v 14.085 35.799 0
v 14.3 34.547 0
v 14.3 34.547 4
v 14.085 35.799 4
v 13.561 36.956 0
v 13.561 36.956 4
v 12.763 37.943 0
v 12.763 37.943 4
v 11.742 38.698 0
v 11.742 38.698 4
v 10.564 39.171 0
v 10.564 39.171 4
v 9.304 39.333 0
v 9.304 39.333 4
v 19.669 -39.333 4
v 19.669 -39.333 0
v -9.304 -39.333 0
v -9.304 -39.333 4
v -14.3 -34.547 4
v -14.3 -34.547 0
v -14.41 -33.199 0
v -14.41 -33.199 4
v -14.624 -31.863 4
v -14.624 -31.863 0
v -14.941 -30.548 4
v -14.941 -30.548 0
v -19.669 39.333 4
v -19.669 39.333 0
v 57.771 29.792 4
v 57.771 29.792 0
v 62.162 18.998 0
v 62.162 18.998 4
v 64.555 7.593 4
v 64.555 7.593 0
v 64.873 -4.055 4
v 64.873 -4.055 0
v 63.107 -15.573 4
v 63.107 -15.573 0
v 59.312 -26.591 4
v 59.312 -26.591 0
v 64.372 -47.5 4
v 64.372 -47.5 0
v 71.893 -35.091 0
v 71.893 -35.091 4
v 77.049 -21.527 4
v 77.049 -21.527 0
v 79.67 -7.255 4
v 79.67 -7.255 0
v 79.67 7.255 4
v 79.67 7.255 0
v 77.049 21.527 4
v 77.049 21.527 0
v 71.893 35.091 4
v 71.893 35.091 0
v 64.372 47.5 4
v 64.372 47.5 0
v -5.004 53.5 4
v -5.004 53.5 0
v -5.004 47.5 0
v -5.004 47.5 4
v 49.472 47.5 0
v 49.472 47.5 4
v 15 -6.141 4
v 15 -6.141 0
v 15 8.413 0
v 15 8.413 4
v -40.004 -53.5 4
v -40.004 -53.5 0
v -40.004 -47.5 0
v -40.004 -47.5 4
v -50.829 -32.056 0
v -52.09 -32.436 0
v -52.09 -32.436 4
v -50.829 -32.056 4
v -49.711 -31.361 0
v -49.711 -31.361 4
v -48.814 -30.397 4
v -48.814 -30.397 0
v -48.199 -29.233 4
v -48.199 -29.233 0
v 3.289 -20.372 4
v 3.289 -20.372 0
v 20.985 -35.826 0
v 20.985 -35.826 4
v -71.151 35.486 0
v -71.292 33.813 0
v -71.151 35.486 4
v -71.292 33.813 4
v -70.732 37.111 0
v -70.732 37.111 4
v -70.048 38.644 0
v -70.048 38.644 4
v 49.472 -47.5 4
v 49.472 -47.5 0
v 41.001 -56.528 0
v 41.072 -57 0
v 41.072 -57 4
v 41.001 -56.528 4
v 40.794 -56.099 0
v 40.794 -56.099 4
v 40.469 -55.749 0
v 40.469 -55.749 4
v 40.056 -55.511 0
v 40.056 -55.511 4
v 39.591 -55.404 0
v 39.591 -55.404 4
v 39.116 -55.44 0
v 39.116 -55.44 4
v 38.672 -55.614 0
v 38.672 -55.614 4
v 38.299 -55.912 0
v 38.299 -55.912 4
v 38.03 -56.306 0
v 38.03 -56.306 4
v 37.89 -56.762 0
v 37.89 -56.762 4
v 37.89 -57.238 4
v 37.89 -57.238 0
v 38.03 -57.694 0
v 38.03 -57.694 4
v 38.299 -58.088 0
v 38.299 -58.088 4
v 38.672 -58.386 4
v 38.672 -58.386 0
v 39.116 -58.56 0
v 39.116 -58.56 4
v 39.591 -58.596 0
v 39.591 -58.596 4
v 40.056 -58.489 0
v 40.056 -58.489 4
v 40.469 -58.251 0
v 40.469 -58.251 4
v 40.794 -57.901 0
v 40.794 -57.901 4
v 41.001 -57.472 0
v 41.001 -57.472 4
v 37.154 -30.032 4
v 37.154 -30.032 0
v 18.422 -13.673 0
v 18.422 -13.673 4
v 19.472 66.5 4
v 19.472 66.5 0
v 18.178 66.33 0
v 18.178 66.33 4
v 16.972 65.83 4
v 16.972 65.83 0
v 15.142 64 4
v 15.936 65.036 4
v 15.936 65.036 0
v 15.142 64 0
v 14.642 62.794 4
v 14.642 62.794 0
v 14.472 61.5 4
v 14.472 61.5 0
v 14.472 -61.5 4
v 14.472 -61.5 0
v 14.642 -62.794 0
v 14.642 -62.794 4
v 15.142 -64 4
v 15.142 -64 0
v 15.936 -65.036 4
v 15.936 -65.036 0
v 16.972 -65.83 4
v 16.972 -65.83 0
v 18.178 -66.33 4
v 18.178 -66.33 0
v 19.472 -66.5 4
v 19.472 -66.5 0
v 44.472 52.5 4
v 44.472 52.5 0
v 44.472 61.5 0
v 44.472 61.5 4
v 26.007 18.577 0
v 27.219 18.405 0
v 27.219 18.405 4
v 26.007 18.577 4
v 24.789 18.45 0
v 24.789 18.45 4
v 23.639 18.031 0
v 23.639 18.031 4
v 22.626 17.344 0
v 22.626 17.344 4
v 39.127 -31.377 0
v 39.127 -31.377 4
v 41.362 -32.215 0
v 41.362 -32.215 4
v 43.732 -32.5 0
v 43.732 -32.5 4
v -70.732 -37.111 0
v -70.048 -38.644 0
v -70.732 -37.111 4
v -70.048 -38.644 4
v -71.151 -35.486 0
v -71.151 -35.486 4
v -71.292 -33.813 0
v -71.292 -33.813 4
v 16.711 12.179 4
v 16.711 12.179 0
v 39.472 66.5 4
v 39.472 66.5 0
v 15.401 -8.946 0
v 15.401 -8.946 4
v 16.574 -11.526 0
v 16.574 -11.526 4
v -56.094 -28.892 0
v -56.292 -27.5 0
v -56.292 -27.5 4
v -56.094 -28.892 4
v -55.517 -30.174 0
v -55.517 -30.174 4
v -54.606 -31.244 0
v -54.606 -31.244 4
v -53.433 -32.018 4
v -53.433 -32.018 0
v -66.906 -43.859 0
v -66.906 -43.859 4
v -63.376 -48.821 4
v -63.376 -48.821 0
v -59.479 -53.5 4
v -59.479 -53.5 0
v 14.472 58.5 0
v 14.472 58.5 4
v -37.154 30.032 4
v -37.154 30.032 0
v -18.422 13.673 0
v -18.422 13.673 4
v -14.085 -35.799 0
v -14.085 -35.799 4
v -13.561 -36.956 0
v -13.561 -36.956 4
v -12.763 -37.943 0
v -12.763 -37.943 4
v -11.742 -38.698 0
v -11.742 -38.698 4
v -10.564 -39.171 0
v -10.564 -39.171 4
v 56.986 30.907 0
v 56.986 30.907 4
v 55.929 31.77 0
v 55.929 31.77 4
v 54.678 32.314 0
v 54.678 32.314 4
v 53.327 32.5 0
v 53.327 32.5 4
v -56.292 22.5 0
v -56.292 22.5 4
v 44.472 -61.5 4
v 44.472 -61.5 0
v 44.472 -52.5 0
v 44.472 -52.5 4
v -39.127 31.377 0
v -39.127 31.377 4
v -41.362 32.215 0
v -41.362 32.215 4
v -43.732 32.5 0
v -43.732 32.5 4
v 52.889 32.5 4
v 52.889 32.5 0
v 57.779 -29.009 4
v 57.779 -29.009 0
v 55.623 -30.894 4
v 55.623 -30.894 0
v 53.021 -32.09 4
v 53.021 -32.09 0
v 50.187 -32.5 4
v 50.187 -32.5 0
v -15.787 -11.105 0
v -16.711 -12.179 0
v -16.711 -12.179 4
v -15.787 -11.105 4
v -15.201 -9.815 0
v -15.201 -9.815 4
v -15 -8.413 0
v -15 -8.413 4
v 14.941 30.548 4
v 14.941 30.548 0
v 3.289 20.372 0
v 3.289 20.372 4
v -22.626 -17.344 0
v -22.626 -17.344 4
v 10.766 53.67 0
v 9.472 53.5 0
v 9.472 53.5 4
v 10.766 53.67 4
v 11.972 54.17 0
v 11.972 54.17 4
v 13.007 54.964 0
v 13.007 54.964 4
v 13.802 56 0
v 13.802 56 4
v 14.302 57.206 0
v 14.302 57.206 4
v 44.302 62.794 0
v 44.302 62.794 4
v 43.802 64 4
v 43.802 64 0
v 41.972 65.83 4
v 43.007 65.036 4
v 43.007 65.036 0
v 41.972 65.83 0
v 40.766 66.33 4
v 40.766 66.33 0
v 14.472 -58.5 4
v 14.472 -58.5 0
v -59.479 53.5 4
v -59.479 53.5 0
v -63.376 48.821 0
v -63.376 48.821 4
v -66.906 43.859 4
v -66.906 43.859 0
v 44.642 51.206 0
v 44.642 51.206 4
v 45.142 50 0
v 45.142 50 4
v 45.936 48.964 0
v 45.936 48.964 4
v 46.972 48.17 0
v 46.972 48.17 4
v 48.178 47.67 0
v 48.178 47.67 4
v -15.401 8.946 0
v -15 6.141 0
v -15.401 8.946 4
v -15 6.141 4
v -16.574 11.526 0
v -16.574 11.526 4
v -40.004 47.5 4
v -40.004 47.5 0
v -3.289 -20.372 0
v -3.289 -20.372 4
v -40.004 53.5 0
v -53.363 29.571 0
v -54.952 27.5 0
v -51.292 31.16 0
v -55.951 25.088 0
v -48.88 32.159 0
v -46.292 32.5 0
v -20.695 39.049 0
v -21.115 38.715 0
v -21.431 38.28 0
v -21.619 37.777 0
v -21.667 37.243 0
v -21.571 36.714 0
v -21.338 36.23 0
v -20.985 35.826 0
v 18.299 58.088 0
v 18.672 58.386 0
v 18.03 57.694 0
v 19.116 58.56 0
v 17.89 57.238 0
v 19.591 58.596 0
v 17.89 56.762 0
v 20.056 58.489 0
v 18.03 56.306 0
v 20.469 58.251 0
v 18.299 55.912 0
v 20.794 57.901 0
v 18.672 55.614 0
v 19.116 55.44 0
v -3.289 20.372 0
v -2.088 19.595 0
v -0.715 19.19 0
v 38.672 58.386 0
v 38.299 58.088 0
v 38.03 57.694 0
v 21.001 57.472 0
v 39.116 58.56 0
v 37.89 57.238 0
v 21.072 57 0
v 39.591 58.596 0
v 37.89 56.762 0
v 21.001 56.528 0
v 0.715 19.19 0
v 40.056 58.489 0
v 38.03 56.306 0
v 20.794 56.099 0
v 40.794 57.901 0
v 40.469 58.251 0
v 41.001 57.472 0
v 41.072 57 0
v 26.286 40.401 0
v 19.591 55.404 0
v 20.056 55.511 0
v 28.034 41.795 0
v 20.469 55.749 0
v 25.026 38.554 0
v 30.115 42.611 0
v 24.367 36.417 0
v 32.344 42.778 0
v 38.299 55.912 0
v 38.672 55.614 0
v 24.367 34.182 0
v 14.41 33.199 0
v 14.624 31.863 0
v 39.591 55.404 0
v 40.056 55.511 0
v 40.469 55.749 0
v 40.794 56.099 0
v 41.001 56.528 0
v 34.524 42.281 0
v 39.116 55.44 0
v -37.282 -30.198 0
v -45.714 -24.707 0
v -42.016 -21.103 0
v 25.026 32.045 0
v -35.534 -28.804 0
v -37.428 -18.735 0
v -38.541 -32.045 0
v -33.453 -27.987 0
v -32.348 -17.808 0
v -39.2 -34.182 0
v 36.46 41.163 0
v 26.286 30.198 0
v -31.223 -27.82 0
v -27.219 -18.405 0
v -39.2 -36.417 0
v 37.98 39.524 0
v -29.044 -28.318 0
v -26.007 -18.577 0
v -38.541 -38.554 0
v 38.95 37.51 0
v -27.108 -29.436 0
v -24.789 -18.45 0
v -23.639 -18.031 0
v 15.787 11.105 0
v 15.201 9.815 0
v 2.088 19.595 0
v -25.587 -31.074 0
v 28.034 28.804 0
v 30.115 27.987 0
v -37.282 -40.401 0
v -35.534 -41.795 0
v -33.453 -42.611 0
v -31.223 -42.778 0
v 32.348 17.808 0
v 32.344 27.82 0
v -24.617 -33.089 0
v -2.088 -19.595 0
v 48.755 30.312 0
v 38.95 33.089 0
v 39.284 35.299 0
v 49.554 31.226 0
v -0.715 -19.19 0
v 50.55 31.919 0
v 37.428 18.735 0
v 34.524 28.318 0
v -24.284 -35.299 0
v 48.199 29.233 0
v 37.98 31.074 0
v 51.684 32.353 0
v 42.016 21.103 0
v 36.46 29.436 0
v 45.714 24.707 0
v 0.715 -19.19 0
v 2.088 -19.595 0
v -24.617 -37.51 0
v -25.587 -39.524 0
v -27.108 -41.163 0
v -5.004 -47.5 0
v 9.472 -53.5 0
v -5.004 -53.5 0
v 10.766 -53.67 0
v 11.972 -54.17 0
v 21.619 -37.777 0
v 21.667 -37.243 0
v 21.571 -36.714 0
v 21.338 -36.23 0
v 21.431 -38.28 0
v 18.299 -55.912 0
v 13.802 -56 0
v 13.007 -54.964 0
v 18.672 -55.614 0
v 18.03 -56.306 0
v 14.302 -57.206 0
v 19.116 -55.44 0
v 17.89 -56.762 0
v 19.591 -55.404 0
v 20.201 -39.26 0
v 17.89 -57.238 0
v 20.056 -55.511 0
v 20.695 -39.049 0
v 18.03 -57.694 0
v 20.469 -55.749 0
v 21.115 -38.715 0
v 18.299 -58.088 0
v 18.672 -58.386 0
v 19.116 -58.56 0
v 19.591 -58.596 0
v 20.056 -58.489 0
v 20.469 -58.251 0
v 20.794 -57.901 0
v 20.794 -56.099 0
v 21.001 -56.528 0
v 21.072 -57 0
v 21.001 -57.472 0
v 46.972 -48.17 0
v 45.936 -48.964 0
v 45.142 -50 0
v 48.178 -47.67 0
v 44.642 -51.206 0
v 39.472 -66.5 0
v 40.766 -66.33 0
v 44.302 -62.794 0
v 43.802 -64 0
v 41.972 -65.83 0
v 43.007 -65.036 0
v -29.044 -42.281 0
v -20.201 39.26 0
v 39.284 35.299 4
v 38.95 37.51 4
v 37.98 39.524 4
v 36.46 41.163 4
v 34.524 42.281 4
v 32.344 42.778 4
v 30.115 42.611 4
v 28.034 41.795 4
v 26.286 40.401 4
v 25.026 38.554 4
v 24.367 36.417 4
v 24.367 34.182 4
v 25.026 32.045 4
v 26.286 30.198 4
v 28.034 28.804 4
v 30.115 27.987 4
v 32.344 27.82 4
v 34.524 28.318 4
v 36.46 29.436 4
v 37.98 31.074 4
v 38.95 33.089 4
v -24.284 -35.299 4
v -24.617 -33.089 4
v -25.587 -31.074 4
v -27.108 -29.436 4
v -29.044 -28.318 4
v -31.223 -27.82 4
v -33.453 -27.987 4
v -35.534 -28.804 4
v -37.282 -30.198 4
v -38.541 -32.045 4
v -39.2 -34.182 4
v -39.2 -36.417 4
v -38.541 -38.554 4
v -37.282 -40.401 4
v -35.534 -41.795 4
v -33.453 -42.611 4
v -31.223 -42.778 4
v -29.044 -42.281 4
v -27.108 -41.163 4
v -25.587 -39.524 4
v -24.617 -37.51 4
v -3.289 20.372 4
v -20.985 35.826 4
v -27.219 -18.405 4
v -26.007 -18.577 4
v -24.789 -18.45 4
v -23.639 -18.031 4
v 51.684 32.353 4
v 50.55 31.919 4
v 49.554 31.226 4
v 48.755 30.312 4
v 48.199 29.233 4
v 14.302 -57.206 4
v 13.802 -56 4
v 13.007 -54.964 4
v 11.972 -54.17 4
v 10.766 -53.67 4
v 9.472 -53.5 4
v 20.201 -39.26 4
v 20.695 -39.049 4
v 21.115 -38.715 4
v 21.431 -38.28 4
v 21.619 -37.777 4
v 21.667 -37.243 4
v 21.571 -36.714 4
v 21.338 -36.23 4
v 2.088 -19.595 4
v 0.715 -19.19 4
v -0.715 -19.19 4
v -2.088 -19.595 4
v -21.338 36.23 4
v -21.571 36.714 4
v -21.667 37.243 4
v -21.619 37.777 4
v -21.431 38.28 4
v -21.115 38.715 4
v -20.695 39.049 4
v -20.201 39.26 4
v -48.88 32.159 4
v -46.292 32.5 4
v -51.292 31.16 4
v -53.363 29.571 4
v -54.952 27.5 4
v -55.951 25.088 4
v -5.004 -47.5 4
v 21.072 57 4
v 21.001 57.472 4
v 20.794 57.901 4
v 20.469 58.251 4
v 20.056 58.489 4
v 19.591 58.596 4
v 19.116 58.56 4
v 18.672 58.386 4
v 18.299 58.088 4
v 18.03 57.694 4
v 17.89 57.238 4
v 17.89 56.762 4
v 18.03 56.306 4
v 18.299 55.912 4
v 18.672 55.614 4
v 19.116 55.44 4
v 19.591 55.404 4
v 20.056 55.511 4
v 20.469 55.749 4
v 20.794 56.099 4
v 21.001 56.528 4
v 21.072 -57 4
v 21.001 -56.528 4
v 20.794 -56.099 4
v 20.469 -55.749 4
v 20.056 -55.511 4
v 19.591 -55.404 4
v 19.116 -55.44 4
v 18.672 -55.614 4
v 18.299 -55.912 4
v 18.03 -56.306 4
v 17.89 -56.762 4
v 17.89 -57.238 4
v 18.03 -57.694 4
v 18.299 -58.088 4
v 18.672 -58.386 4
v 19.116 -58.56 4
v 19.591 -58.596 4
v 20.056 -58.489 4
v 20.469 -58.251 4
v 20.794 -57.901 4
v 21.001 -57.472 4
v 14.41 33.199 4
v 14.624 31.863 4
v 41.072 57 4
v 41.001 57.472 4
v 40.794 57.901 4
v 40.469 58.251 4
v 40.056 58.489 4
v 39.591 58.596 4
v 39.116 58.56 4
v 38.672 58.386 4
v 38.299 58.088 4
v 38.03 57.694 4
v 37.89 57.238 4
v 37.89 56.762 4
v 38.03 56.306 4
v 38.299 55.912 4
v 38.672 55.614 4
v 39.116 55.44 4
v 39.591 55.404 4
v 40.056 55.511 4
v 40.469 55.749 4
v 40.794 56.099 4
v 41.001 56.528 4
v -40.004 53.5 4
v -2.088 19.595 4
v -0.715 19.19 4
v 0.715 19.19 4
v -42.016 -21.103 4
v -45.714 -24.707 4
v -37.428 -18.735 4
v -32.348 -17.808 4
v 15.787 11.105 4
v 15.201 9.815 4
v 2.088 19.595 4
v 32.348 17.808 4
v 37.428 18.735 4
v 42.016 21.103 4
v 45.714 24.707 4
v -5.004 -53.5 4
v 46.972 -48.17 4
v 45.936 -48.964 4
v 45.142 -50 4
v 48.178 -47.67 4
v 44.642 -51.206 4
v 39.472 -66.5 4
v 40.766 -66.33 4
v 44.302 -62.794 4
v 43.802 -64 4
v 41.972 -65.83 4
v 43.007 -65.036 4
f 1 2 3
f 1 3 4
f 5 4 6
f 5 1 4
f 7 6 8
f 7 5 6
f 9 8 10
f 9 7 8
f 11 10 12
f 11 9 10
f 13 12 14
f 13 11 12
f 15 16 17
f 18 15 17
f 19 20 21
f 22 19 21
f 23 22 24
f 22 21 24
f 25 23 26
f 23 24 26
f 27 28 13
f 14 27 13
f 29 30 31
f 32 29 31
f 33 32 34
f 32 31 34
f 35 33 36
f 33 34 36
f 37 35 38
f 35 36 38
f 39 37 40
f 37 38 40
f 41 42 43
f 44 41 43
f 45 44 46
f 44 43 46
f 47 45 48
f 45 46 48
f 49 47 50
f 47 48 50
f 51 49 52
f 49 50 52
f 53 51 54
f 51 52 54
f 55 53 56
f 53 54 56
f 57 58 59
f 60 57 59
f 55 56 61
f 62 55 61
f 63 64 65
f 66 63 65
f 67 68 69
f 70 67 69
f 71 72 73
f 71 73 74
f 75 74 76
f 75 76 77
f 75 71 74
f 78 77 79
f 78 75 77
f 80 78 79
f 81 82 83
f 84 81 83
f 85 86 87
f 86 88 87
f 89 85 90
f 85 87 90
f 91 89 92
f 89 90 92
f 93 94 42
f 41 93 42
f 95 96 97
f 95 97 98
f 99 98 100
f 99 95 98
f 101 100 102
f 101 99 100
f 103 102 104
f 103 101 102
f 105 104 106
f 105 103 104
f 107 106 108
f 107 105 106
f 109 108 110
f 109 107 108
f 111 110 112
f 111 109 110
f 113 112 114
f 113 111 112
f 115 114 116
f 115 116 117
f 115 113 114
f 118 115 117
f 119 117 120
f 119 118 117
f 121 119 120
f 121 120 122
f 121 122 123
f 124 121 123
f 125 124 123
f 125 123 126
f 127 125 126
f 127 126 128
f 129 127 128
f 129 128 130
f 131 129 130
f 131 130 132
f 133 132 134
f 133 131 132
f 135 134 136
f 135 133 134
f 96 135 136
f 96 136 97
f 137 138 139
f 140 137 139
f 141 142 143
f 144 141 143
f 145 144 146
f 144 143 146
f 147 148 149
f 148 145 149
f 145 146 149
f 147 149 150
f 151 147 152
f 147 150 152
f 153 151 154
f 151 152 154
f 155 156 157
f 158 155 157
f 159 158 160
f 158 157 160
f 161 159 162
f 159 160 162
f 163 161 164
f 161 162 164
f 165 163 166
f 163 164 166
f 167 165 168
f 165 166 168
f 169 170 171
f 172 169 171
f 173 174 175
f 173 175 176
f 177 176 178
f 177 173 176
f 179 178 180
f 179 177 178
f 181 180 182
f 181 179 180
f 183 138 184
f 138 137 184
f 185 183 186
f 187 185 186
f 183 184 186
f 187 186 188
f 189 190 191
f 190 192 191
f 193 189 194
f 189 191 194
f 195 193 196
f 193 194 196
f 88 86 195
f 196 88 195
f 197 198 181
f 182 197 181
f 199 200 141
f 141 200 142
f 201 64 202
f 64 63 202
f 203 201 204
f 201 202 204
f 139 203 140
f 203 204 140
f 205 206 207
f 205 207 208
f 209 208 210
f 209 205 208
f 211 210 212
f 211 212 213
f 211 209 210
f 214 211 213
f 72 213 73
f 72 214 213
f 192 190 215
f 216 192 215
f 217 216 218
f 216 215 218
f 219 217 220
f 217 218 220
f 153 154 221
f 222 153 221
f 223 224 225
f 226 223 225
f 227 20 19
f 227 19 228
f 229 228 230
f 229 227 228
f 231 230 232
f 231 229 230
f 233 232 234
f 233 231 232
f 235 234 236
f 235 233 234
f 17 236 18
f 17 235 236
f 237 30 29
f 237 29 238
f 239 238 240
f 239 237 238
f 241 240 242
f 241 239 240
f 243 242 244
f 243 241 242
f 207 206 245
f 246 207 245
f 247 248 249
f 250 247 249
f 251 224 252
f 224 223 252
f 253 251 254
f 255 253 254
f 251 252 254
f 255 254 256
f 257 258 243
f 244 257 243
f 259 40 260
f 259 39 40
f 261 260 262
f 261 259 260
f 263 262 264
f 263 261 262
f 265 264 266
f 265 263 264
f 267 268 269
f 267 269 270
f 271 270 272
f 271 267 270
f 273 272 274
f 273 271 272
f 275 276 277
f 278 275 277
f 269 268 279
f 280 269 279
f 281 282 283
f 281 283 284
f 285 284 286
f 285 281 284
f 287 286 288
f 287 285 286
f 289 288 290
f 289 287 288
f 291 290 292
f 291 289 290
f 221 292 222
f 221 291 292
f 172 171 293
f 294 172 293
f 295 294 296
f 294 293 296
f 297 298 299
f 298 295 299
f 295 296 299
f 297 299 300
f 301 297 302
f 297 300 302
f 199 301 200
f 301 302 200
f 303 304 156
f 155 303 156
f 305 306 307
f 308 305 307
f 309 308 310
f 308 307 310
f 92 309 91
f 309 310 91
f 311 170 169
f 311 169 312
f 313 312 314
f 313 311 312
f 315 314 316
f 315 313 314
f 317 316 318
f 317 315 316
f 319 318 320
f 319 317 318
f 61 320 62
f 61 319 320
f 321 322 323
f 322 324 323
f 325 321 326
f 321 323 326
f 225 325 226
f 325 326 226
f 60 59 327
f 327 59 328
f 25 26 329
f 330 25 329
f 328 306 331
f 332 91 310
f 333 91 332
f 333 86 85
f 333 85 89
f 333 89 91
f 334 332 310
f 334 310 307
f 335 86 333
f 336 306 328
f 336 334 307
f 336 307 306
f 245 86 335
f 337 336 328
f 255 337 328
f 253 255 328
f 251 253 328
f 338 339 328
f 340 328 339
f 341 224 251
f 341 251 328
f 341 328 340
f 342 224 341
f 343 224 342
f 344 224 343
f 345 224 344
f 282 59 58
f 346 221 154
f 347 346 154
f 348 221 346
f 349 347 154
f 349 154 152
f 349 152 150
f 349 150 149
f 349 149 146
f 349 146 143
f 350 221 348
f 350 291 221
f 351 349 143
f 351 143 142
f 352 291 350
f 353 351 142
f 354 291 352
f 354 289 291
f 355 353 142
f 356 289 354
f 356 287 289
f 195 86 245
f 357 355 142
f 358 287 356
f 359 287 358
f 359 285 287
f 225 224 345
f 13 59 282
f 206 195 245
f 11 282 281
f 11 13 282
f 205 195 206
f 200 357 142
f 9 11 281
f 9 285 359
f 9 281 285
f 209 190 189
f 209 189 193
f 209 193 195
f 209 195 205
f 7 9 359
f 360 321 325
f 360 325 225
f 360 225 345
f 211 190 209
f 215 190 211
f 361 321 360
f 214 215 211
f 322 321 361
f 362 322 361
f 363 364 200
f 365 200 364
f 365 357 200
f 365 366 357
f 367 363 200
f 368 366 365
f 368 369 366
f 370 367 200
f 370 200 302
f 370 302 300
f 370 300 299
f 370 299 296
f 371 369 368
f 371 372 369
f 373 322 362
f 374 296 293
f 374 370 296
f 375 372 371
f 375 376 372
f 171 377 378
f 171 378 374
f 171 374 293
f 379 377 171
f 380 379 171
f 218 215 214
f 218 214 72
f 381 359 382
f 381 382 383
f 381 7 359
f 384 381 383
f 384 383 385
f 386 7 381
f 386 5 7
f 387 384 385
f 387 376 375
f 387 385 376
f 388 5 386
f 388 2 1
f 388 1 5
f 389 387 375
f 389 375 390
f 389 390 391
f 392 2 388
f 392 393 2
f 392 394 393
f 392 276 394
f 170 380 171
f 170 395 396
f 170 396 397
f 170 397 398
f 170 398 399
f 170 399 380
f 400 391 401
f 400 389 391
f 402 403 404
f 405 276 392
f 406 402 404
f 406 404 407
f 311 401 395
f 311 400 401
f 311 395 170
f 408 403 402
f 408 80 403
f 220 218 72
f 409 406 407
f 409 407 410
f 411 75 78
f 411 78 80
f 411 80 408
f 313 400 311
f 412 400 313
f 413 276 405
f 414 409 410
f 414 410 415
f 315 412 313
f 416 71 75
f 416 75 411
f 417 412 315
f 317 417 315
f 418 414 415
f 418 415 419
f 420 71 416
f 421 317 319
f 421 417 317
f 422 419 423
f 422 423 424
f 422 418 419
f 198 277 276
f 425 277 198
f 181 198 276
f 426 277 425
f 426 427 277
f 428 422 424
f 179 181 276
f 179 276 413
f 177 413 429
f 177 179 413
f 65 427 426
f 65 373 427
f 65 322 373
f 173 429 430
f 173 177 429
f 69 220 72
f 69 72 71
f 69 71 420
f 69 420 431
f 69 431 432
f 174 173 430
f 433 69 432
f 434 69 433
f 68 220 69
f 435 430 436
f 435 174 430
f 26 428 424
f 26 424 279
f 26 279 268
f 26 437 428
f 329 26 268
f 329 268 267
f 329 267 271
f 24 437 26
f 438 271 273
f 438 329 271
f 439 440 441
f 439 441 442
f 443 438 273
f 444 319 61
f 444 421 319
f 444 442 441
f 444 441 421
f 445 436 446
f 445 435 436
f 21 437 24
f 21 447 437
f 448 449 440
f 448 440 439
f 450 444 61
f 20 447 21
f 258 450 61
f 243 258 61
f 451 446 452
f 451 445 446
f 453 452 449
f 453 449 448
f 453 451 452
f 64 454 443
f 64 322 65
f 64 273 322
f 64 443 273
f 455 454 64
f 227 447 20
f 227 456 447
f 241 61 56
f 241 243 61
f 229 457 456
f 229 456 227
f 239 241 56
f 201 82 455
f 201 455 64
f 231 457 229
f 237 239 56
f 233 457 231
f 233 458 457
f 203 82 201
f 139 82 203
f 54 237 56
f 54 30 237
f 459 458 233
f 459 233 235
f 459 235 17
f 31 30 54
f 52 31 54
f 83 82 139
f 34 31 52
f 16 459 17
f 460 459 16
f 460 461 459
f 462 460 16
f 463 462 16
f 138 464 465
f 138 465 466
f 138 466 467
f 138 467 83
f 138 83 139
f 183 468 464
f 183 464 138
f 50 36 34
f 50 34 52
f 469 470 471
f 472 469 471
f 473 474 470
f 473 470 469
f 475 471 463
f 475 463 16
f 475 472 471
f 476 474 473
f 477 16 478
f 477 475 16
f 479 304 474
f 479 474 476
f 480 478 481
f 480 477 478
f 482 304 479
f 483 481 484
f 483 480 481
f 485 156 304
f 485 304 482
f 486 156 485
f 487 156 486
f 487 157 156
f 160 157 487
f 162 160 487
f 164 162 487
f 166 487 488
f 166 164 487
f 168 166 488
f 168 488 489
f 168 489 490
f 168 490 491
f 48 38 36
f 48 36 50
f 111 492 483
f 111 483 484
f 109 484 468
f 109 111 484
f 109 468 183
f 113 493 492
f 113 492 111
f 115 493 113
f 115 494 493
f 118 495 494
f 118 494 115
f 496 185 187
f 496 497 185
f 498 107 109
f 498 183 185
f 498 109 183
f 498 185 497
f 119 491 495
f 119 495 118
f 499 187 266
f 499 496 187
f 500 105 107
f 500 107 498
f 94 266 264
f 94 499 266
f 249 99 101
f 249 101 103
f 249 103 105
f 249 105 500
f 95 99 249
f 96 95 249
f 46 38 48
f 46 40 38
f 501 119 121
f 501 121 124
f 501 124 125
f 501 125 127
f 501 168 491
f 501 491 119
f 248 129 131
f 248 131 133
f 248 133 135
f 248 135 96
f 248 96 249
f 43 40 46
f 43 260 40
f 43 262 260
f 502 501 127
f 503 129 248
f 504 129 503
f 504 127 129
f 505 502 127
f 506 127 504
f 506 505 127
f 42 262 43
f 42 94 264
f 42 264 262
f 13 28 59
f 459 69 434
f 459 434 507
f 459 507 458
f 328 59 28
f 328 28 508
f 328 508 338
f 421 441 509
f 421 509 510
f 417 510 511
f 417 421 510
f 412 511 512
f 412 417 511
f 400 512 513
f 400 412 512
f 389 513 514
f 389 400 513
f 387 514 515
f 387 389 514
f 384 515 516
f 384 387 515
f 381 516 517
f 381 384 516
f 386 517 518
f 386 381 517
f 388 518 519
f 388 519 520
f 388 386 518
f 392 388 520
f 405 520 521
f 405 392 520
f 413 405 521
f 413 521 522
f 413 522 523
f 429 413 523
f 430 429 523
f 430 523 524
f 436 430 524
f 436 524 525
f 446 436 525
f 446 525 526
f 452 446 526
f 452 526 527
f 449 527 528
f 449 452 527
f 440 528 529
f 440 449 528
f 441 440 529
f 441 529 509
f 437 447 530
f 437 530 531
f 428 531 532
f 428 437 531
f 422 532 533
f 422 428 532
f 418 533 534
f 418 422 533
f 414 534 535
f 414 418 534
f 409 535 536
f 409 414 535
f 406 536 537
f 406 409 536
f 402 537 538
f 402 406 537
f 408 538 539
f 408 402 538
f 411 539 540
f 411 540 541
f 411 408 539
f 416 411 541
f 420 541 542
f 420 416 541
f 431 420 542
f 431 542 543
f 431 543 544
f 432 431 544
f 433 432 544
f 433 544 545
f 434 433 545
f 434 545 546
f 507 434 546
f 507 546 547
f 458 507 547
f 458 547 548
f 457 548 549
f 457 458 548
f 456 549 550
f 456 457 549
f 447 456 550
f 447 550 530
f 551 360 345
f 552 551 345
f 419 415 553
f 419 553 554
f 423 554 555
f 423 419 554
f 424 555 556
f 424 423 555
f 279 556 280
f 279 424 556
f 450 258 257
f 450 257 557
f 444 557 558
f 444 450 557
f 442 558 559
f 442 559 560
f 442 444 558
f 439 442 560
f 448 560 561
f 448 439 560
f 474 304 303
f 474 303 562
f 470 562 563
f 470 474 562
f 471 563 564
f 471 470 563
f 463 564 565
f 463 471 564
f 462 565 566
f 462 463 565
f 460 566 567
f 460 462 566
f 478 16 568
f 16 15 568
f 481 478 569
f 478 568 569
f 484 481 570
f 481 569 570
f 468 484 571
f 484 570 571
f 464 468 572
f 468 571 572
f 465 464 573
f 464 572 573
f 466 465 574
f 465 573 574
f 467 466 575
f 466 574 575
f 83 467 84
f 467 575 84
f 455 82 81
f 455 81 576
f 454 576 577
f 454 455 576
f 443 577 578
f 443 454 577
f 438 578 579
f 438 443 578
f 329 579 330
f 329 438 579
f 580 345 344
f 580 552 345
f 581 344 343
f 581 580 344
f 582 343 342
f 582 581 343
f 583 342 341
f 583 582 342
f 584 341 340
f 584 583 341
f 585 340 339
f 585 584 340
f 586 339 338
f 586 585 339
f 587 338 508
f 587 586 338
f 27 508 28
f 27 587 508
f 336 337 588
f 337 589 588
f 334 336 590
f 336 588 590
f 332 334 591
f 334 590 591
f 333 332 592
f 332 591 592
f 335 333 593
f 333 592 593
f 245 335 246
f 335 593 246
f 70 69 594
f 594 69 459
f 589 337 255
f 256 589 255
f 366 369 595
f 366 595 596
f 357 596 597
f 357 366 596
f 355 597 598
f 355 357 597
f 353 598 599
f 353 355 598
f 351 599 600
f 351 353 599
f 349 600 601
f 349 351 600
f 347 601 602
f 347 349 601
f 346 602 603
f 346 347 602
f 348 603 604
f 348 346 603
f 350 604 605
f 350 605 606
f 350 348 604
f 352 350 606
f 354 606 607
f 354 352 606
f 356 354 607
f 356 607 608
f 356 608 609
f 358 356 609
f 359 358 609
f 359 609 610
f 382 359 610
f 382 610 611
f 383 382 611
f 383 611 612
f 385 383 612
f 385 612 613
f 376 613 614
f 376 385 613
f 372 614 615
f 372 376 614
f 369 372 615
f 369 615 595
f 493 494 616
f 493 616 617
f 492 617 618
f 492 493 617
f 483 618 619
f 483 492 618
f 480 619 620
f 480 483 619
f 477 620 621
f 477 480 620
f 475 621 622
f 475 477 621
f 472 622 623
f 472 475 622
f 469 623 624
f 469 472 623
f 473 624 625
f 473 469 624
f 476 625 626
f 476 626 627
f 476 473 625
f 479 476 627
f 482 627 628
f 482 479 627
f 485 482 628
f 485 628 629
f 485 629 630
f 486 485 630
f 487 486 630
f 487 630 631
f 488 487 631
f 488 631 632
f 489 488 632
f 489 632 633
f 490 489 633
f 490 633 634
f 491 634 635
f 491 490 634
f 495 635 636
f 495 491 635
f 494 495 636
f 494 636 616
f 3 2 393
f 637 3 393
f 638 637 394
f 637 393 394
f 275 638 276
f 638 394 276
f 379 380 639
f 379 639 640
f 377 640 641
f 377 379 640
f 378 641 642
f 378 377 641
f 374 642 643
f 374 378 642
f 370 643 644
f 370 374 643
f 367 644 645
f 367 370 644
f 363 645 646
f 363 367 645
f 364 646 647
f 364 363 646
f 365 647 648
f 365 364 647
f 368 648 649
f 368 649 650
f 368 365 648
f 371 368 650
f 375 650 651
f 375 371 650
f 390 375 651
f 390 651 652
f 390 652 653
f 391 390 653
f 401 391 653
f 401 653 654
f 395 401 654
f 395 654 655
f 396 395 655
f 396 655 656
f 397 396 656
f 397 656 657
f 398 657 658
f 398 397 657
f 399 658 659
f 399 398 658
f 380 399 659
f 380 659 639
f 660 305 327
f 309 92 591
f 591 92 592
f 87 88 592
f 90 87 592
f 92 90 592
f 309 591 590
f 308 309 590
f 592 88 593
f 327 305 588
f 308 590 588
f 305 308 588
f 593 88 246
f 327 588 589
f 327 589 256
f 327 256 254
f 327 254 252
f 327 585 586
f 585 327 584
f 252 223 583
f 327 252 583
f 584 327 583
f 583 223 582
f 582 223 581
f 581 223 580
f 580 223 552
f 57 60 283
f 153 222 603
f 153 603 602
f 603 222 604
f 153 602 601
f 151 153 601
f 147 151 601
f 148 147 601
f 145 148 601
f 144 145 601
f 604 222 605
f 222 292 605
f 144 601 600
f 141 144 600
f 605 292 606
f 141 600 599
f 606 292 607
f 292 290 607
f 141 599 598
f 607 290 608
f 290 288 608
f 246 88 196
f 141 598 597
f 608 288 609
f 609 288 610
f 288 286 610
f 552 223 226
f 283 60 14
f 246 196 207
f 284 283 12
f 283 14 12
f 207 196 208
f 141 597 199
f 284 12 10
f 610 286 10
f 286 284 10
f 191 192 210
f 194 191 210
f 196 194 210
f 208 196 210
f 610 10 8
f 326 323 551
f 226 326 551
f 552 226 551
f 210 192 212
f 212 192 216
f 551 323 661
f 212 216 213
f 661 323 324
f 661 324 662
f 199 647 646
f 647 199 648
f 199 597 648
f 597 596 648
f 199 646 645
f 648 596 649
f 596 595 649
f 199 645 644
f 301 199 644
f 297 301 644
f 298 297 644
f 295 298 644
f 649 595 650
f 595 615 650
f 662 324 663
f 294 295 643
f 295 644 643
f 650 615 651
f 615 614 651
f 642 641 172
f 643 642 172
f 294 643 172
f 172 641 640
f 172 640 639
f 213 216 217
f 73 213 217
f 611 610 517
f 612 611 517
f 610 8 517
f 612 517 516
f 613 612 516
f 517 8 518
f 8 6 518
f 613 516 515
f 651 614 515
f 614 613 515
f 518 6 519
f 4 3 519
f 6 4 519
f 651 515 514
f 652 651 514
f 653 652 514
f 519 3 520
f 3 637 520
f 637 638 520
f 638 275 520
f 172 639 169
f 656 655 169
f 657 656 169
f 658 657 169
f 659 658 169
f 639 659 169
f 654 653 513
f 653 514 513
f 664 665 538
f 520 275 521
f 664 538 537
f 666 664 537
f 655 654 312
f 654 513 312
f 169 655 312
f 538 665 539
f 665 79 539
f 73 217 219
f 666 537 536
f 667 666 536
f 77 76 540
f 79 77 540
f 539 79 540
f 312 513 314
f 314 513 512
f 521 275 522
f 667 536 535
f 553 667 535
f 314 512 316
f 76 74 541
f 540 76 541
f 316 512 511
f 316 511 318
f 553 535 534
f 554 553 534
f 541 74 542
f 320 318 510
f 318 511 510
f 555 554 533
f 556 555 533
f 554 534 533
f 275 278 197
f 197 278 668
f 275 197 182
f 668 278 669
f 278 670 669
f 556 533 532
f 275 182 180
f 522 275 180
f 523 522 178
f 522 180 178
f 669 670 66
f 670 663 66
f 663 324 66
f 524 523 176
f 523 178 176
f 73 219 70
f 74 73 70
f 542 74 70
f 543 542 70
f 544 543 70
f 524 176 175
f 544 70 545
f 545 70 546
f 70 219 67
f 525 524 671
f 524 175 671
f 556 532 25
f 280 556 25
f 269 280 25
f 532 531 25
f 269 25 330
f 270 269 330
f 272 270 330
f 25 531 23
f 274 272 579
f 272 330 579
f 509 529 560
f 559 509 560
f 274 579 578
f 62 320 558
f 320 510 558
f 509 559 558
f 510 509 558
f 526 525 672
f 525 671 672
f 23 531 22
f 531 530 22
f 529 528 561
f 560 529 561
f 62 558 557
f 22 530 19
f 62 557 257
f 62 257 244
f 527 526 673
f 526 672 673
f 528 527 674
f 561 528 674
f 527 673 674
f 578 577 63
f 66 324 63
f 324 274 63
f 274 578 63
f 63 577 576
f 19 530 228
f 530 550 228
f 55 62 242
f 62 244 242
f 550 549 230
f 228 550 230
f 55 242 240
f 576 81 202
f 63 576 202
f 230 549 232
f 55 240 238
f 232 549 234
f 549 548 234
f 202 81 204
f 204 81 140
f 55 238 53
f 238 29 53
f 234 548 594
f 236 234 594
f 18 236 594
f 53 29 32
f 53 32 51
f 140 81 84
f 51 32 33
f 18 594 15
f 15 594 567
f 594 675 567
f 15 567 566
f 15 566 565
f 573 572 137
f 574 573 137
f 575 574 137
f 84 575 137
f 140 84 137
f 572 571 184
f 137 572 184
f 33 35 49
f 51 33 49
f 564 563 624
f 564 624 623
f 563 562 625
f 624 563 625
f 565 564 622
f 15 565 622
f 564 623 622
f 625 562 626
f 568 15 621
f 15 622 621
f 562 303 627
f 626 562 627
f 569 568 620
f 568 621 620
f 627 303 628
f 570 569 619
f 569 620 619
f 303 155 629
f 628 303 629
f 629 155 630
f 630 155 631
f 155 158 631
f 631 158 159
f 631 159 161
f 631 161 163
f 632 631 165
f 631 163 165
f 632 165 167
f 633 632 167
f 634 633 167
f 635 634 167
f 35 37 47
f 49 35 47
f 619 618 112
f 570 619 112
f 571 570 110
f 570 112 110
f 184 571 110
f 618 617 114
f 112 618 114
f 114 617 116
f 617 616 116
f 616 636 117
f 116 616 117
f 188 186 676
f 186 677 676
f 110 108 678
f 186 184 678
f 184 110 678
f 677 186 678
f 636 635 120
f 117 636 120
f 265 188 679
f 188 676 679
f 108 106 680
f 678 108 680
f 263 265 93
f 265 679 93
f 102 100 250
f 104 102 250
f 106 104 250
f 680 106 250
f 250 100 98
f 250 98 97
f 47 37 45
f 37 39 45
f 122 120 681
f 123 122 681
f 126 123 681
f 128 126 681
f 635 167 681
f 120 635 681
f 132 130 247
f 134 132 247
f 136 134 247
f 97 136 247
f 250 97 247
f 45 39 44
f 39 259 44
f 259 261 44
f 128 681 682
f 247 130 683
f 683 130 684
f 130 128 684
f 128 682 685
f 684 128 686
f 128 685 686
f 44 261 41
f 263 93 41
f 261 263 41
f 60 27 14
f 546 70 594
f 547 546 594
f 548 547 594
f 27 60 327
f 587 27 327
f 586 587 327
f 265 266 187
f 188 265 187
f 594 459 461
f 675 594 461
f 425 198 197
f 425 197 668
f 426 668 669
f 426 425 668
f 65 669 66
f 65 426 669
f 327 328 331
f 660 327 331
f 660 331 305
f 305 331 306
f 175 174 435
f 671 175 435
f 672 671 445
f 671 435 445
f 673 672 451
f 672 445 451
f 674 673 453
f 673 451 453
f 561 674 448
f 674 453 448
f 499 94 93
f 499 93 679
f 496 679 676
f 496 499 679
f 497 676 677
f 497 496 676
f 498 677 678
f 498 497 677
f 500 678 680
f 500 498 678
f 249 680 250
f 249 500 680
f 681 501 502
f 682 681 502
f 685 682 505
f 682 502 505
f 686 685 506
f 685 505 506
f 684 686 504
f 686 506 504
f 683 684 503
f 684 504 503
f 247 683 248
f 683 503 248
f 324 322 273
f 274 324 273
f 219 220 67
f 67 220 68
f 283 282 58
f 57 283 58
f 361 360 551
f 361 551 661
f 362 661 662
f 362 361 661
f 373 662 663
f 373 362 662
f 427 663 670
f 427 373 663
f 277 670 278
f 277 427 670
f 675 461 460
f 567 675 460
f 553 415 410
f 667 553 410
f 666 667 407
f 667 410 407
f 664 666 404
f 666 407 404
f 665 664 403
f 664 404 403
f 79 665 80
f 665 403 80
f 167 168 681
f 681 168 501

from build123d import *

# Parameters (mm, degrees)
ESBO_O1_R                = 7.5
ESBO_O1_R_2              = 1.6
RESSALTO_EXTRUS_O1_DEPTH = 4
FILETE2_R                = 10
FILETE3_R                = 5
FILETE4_R                = 2


with BuildPart() as part:
    # Esboço1 → Ressalto-extrusão1 (new body)
    with BuildSketch(Plane.XY):
        with BuildLine():
            Line((14.471901241, -53.5), (14.471901241, -66.5))
            Line((14.471901241, -66.5), (44.471901241, -66.5))
            Line((44.471901241, -66.5), (44.471901241, -47.5))
            Line((44.471901241, -47.5), (64.371965948, -47.5))
            ThreePointArc((64.371965948, -47.5), (80, 0), (64.371965948, 47.5))
            Line((64.371965948, 47.5), (44.471901241, 47.5))
            Line((44.471901241, 47.5), (44.471901241, 66.5))
            Line((44.471901241, 66.5), (14.471901241, 66.5))
            Line((14.471901241, 66.5), (14.471901241, 53.5))
            Line((14.471901241, 53.5), (-5.003543323, 53.5))
            Line((-5.003543323, 53.5), (-5.003543323, 47.5))
            Line((-5.003543323, 47.5), (-40.003543323, 47.5))
            Line((-40.003543323, 47.5), (-40.003543323, 53.5))
            Line((-40.003543323, 53.5), (-59.478987886, 53.5))
            ThreePointArc((-59.478987886, 53.5), (-65.948635083, 45.285511266), (-71.291651246, 36.297389198))
            Line((-71.291651246, 36.297389198), (-71.291651246, -36.297389198))
            ThreePointArc((-71.291651246, -36.297389198), (-65.948635083, -45.285511266), (-59.478987886, -53.5))
            Line((-59.478987886, -53.5), (-40.003543323, -53.5))
            Line((-40.003543323, -53.5), (-40.003543323, -47.5))
            Line((-40.003543323, -47.5), (-5.003543323, -47.5))
            Line((-5.003543323, -47.5), (-5.003543323, -53.5))
            Line((-5.003543323, -53.5), (14.471901241, -53.5))
        make_face()
        with Locations((-31.783703802, -35.29937921)):
            Circle(ESBO_O1_R, mode=Mode.SUBTRACT)
        with Locations((19.471901241, -57)):
            Circle(ESBO_O1_R_2, mode=Mode.SUBTRACT)
        with Locations((39.471901241, -57)):
            Circle(ESBO_O1_R_2, mode=Mode.SUBTRACT)
        with BuildLine():
            Line((25, -39.332538239), (-14.754798134, -39.332538239))
            ThreePointArc((-14.754798134, -39.332538239), (-14.287636143, -34.928412284), (-14.941054623, -30.548045856))
            Line((-14.941054623, -30.548045856), (0, -17.5))
            Line((0, -17.5), (25, -39.332538239))
        make_face(mode=Mode.SUBTRACT)
        with BuildLine():
            Line((-15, -10.684767074), (-24.807750727, -19.249890785))
            ThreePointArc((-24.807750727, -19.249890785), (-40.174599446, -19.942202702), (-49.058352164, -32.5))
            Line((-49.058352164, -32.5), (-56.291651246, -32.5))
            Line((-56.291651246, -32.5), (-56.291651246, 32.5))
            Line((-56.291651246, 32.5), (-39.980184035, 32.5))
            Line((-39.980184035, 32.5), (-15, 10.684767074))
            Line((-15, 10.684767074), (-15, -10.684767074))
        make_face(mode=Mode.SUBTRACT)
        with BuildLine():
            Line((49.058352164, 32.5), (56.291651246, 32.5))
            ThreePointArc((56.291651246, 32.5), (65, 0), (56.291651246, -32.5))
            Line((56.291651246, -32.5), (39.980184035, -32.5))
            Line((39.980184035, -32.5), (15, -10.684767074))
            Line((15, -10.684767074), (15, 10.684767074))
            Line((15, 10.684767074), (24.807750727, 19.249890785))
            ThreePointArc((24.807750727, 19.249890785), (40.174599446, 19.942202702), (49.058352164, 32.5))
        make_face(mode=Mode.SUBTRACT)
        with BuildLine():
            Line((0, 17.5), (-25, 39.332538239))
            Line((-25, 39.332538239), (14.754798134, 39.332538239))
            ThreePointArc((14.754798134, 39.332538239), (14.287636143, 34.928412284), (14.941054623, 30.548045856))
            Line((14.941054623, 30.548045856), (0, 17.5))
        make_face(mode=Mode.SUBTRACT)
        with Locations((19.471901241, 57)):
            Circle(ESBO_O1_R_2, mode=Mode.SUBTRACT)
        with Locations((39.471901241, 57)):
            Circle(ESBO_O1_R_2, mode=Mode.SUBTRACT)
        with Locations((31.783703802, 35.29937921)):
            Circle(ESBO_O1_R, mode=Mode.SUBTRACT)
    extrude(amount=RESSALTO_EXTRUS_O1_DEPTH)

    # Filete2
    filete2_edges = [part.edges().sort_by_distance(p)[0] for p in [
        (-71.291651246, -36.297389198, 2),
        (-71.291651246, 36.297389198, 2),
        (15, -10.684767074, 2),
        (39.980184035, -32.5, 2),
        (56.291651246, -32.5, 2),
        (-15, 10.684767074, 2),
        (-39.980184035, 32.5, 2),
        (-56.291651246, 32.5, 2),
    ]]
    fillet(filete2_edges, radius=FILETE2_R)

    # Filete3
    # the kernel refuses this fillet: 5 mm, written as the material it adds along each edge
    with BuildSketch(Plane(origin=(56.291651246, 32.5, 0), x_dir=(0.47930172295418866, -0.8776501913479802, 0), z_dir=(0, 0, 1))) as filete3_piece_1:
        with BuildLine():
            CenterArc((2.96720344, -4.998591114), FILETE3_R, 88.639806368, 62.720387264)
            Line((-1.421047517, -2.602082499), (0, 0))
            ThreePointArc((0, 0), (1.542945789, 0.018315517), (3.085891577, 0))
        make_face()
    extrude(amount=4)
    with BuildSketch(Plane(origin=(49.058352164, 32.5, 0), x_dir=(1, 0, 0), z_dir=(0, 0, 1))) as filete3_piece_2:
        with BuildLine():
            CenterArc((3.830319867, -5), FILETE3_R, 90, 69.718116788)
            ThreePointArc((-0.859673073, -3.26680462), (-0.35082821, -1.654193676), (0, 0))
            Line((0, 0), (3.830319867, 0))
        make_face()
    extrude(amount=4)
    with BuildSketch(Plane(origin=(24.807750727, 19.249890785, 0), x_dir=(0.9437647380510182, -0.3306177841730431, 0), z_dir=(0, 0, 1))) as filete3_piece_3:
        with BuildLine():
            CenterArc((2.919799374, -4.986661539), FILETE3_R, 94.186027535, 56.251011404)
            Line((-1.429270912, -2.519763153), (0, 0))
            ThreePointArc((0, 0), (1.277412226, -0.046684613), (2.554824452, 0))
        make_face()
    extrude(amount=4)
    with BuildSketch(Plane(origin=(15, 10.684767074, 0), x_dir=(0.7532103380208672, 0.6577797402615034, 0), z_dir=(0, 0, 1))) as filete3_piece_4:
        with BuildLine():
            CenterArc((FILETE3_R * 0.454348861751, -FILETE3_R), FILETE3_R, 90, 48.869237816)
            Line((-FILETE3_R * 0.29886147627, -FILETE3_R * 0.342220259738), (0, 0))
            Line((0, 0), (FILETE3_R * 0.454348861751, 0))
        make_face()
    extrude(amount=4)
    with BuildSketch(Plane(origin=(-15, -10.684767074, 0), x_dir=(0, 1, 0), z_dir=(0, 0, 1))) as filete3_piece_5:
        with BuildLine():
            CenterArc((FILETE3_R * 0.454348861751, FILETE3_R), FILETE3_R, 221.130762184, 48.869237816)
            Line((-FILETE3_R * 0.29886147627, FILETE3_R * 0.342220259738), (0, 0))
            Line((0, 0), (FILETE3_R * 0.454348861751, 0))
        make_face()
    extrude(amount=4)
    with BuildSketch(Plane(origin=(-24.807750727, -19.249890785, 0), x_dir=(0.7532103380209099, 0.6577797402614547, 0), z_dir=(0, 0, 1))) as filete3_piece_6:
        with BuildLine():
            CenterArc((2.896898633, 5), FILETE3_R, 213.748988596, 56.251011404)
            ThreePointArc((-1.260498463, 2.222222222), (-0.589642299, 1.13414435), (0, 0))
            Line((0, 0), (2.896898633, 0))
        make_face()
    extrude(amount=4)
    with BuildSketch(Plane(origin=(-49.058352164, -32.5, 0), x_dir=(0.2544898792174261, 0.9670754372725532, 0), z_dir=(0, 0, 1))) as filete3_piece_7:
        with BuildLine():
            CenterArc((3.860599546, 4.976657656), FILETE3_R, 194.74336021, 69.718116788)
            Line((-0.97477764, 3.70420826), (0, 0))
            ThreePointArc((0, 0), (1.689012301, 0.081698204), (3.378024603, 0))
        make_face()
    extrude(amount=4)
    with BuildSketch(Plane(origin=(14.754798134, 39.332538239, 0), x_dir=(-0.09464454898712658, -0.9955111296952049, 0), z_dir=(0, 0, 1))) as filete3_piece_8:
        with BuildLine():
            CenterArc((5.493397952, -4.952623325), FILETE3_R, 97.893660423, 87.537201367)
            Line((0.515842303, -5.42584607), (0, 0))
            ThreePointArc((0, 0), (2.403361604, -0.165818364), (4.806723208, 0))
        make_face()
    extrude(amount=4)
    with BuildSketch(Plane(origin=(0, 17.5, 0), x_dir=(0.7532103380208671, 0.6577797402615035, 0), z_dir=(0, 0, 1)), Plane(origin=(0, -17.5, 0), x_dir=(-0.7532103380208676, -0.6577797402615031, 0), z_dir=(0, 0, 1))) as filete3_piece_9:
        with BuildLine():
            CenterArc((FILETE3_R * 0.873301529543, FILETE3_R), FILETE3_R, 187.738475632, 82.261524368)
            Line((-FILETE3_R * 0.117591471468, FILETE3_R * 0.865348373397), (0, 0))
            Line((0, 0), (FILETE3_R * 0.873301529543, 0))
        make_face()
    extrude(amount=4)
    with BuildSketch(Plane(origin=(-14.754798134, -39.332538239, 0), x_dir=(1, 0, 0), z_dir=(0, 0, 1))) as filete3_piece_10:
        with BuildLine():
            CenterArc((5.450311812, 5), FILETE3_R, 182.462798633, 87.537201367)
            ThreePointArc((0.45493015, 4.785146451), (0.392539102, 2.376879421), (0, 0))
            Line((0, 0), (5.450311812, 0))
        make_face()
    extrude(amount=4)
    with BuildSketch(Plane(origin=(14.471901241, 53.5, 0), x_dir=(-1, 0, 0), z_dir=(0, 0, 1)), Plane(origin=(44.471901241, -47.5, 0), x_dir=(1, 0, 0), z_dir=(0, 0, 1)), Plane(origin=(44.471901241, 47.5, 0), x_dir=(0, 1, 0), z_dir=(0, 0, 1))) as filete3_piece_11:
        with BuildLine():
            CenterArc((FILETE3_R, -FILETE3_R), FILETE3_R, 90, 90)
            Line((0, -FILETE3_R), (0, 0))
            Line((0, 0), (FILETE3_R, 0))
        make_face()
    extrude(amount=4)
    with BuildSketch(Plane(origin=(14.471901241, -53.5, 0), x_dir=(-1, 0, 0), z_dir=(0, 0, 1)), Plane(origin=(-56.291651246, -32.5, 0), x_dir=(1, 0, 0), z_dir=(0, 0, 1))) as filete3_piece_12:
        with BuildLine():
            CenterArc((FILETE3_R, FILETE3_R), FILETE3_R, 180, 90)
            Line((0, FILETE3_R), (0, 0))
            Line((0, 0), (FILETE3_R, 0))
        make_face()
    extrude(amount=4)
    # the kernel refuses this fillet: 5 mm, written as the material it takes off along each edge
    with BuildSketch(Plane(origin=(14.471901241, -66.5, -12.5), x_dir=(0, 1, 0), z_dir=(0, 0, 1)), Plane(origin=(44.471901241, -66.5, -12.5), x_dir=(-1, 0, 0), z_dir=(0, 0, 1))) as filete3_2_piece_1:
        with BuildLine():
            CenterArc((FILETE3_R, -FILETE3_R), FILETE3_R, 90, 90)
            Line((0, -FILETE3_R), (0, 0))
            Line((0, 0), (FILETE3_R, 0))
        make_face()
    extrude(amount=29, mode=Mode.SUBTRACT)
    with BuildSketch(Plane(origin=(14.471901241, 66.5, -12.5), x_dir=(0, -1, 0), z_dir=(0, 0, 1)), Plane(origin=(44.471901241, 66.5, -12.5), x_dir=(-1, 0, 0), z_dir=(0, 0, 1))) as filete3_2_piece_2:
        with BuildLine():
            CenterArc((FILETE3_R, FILETE3_R), FILETE3_R, 180, 90)
            Line((0, FILETE3_R), (0, 0))
            Line((0, 0), (FILETE3_R, 0))
        make_face()
    extrude(amount=29, mode=Mode.SUBTRACT)

    # Filete4
    filete4_edges = [part.edges().sort_by_distance(p)[0] for p in [
        (-25, 39.332538239, 2),
        (25, -39.332538239, 2),
    ]]
    fillet(filete4_edges, radius=FILETE4_R)


solid = part.part
